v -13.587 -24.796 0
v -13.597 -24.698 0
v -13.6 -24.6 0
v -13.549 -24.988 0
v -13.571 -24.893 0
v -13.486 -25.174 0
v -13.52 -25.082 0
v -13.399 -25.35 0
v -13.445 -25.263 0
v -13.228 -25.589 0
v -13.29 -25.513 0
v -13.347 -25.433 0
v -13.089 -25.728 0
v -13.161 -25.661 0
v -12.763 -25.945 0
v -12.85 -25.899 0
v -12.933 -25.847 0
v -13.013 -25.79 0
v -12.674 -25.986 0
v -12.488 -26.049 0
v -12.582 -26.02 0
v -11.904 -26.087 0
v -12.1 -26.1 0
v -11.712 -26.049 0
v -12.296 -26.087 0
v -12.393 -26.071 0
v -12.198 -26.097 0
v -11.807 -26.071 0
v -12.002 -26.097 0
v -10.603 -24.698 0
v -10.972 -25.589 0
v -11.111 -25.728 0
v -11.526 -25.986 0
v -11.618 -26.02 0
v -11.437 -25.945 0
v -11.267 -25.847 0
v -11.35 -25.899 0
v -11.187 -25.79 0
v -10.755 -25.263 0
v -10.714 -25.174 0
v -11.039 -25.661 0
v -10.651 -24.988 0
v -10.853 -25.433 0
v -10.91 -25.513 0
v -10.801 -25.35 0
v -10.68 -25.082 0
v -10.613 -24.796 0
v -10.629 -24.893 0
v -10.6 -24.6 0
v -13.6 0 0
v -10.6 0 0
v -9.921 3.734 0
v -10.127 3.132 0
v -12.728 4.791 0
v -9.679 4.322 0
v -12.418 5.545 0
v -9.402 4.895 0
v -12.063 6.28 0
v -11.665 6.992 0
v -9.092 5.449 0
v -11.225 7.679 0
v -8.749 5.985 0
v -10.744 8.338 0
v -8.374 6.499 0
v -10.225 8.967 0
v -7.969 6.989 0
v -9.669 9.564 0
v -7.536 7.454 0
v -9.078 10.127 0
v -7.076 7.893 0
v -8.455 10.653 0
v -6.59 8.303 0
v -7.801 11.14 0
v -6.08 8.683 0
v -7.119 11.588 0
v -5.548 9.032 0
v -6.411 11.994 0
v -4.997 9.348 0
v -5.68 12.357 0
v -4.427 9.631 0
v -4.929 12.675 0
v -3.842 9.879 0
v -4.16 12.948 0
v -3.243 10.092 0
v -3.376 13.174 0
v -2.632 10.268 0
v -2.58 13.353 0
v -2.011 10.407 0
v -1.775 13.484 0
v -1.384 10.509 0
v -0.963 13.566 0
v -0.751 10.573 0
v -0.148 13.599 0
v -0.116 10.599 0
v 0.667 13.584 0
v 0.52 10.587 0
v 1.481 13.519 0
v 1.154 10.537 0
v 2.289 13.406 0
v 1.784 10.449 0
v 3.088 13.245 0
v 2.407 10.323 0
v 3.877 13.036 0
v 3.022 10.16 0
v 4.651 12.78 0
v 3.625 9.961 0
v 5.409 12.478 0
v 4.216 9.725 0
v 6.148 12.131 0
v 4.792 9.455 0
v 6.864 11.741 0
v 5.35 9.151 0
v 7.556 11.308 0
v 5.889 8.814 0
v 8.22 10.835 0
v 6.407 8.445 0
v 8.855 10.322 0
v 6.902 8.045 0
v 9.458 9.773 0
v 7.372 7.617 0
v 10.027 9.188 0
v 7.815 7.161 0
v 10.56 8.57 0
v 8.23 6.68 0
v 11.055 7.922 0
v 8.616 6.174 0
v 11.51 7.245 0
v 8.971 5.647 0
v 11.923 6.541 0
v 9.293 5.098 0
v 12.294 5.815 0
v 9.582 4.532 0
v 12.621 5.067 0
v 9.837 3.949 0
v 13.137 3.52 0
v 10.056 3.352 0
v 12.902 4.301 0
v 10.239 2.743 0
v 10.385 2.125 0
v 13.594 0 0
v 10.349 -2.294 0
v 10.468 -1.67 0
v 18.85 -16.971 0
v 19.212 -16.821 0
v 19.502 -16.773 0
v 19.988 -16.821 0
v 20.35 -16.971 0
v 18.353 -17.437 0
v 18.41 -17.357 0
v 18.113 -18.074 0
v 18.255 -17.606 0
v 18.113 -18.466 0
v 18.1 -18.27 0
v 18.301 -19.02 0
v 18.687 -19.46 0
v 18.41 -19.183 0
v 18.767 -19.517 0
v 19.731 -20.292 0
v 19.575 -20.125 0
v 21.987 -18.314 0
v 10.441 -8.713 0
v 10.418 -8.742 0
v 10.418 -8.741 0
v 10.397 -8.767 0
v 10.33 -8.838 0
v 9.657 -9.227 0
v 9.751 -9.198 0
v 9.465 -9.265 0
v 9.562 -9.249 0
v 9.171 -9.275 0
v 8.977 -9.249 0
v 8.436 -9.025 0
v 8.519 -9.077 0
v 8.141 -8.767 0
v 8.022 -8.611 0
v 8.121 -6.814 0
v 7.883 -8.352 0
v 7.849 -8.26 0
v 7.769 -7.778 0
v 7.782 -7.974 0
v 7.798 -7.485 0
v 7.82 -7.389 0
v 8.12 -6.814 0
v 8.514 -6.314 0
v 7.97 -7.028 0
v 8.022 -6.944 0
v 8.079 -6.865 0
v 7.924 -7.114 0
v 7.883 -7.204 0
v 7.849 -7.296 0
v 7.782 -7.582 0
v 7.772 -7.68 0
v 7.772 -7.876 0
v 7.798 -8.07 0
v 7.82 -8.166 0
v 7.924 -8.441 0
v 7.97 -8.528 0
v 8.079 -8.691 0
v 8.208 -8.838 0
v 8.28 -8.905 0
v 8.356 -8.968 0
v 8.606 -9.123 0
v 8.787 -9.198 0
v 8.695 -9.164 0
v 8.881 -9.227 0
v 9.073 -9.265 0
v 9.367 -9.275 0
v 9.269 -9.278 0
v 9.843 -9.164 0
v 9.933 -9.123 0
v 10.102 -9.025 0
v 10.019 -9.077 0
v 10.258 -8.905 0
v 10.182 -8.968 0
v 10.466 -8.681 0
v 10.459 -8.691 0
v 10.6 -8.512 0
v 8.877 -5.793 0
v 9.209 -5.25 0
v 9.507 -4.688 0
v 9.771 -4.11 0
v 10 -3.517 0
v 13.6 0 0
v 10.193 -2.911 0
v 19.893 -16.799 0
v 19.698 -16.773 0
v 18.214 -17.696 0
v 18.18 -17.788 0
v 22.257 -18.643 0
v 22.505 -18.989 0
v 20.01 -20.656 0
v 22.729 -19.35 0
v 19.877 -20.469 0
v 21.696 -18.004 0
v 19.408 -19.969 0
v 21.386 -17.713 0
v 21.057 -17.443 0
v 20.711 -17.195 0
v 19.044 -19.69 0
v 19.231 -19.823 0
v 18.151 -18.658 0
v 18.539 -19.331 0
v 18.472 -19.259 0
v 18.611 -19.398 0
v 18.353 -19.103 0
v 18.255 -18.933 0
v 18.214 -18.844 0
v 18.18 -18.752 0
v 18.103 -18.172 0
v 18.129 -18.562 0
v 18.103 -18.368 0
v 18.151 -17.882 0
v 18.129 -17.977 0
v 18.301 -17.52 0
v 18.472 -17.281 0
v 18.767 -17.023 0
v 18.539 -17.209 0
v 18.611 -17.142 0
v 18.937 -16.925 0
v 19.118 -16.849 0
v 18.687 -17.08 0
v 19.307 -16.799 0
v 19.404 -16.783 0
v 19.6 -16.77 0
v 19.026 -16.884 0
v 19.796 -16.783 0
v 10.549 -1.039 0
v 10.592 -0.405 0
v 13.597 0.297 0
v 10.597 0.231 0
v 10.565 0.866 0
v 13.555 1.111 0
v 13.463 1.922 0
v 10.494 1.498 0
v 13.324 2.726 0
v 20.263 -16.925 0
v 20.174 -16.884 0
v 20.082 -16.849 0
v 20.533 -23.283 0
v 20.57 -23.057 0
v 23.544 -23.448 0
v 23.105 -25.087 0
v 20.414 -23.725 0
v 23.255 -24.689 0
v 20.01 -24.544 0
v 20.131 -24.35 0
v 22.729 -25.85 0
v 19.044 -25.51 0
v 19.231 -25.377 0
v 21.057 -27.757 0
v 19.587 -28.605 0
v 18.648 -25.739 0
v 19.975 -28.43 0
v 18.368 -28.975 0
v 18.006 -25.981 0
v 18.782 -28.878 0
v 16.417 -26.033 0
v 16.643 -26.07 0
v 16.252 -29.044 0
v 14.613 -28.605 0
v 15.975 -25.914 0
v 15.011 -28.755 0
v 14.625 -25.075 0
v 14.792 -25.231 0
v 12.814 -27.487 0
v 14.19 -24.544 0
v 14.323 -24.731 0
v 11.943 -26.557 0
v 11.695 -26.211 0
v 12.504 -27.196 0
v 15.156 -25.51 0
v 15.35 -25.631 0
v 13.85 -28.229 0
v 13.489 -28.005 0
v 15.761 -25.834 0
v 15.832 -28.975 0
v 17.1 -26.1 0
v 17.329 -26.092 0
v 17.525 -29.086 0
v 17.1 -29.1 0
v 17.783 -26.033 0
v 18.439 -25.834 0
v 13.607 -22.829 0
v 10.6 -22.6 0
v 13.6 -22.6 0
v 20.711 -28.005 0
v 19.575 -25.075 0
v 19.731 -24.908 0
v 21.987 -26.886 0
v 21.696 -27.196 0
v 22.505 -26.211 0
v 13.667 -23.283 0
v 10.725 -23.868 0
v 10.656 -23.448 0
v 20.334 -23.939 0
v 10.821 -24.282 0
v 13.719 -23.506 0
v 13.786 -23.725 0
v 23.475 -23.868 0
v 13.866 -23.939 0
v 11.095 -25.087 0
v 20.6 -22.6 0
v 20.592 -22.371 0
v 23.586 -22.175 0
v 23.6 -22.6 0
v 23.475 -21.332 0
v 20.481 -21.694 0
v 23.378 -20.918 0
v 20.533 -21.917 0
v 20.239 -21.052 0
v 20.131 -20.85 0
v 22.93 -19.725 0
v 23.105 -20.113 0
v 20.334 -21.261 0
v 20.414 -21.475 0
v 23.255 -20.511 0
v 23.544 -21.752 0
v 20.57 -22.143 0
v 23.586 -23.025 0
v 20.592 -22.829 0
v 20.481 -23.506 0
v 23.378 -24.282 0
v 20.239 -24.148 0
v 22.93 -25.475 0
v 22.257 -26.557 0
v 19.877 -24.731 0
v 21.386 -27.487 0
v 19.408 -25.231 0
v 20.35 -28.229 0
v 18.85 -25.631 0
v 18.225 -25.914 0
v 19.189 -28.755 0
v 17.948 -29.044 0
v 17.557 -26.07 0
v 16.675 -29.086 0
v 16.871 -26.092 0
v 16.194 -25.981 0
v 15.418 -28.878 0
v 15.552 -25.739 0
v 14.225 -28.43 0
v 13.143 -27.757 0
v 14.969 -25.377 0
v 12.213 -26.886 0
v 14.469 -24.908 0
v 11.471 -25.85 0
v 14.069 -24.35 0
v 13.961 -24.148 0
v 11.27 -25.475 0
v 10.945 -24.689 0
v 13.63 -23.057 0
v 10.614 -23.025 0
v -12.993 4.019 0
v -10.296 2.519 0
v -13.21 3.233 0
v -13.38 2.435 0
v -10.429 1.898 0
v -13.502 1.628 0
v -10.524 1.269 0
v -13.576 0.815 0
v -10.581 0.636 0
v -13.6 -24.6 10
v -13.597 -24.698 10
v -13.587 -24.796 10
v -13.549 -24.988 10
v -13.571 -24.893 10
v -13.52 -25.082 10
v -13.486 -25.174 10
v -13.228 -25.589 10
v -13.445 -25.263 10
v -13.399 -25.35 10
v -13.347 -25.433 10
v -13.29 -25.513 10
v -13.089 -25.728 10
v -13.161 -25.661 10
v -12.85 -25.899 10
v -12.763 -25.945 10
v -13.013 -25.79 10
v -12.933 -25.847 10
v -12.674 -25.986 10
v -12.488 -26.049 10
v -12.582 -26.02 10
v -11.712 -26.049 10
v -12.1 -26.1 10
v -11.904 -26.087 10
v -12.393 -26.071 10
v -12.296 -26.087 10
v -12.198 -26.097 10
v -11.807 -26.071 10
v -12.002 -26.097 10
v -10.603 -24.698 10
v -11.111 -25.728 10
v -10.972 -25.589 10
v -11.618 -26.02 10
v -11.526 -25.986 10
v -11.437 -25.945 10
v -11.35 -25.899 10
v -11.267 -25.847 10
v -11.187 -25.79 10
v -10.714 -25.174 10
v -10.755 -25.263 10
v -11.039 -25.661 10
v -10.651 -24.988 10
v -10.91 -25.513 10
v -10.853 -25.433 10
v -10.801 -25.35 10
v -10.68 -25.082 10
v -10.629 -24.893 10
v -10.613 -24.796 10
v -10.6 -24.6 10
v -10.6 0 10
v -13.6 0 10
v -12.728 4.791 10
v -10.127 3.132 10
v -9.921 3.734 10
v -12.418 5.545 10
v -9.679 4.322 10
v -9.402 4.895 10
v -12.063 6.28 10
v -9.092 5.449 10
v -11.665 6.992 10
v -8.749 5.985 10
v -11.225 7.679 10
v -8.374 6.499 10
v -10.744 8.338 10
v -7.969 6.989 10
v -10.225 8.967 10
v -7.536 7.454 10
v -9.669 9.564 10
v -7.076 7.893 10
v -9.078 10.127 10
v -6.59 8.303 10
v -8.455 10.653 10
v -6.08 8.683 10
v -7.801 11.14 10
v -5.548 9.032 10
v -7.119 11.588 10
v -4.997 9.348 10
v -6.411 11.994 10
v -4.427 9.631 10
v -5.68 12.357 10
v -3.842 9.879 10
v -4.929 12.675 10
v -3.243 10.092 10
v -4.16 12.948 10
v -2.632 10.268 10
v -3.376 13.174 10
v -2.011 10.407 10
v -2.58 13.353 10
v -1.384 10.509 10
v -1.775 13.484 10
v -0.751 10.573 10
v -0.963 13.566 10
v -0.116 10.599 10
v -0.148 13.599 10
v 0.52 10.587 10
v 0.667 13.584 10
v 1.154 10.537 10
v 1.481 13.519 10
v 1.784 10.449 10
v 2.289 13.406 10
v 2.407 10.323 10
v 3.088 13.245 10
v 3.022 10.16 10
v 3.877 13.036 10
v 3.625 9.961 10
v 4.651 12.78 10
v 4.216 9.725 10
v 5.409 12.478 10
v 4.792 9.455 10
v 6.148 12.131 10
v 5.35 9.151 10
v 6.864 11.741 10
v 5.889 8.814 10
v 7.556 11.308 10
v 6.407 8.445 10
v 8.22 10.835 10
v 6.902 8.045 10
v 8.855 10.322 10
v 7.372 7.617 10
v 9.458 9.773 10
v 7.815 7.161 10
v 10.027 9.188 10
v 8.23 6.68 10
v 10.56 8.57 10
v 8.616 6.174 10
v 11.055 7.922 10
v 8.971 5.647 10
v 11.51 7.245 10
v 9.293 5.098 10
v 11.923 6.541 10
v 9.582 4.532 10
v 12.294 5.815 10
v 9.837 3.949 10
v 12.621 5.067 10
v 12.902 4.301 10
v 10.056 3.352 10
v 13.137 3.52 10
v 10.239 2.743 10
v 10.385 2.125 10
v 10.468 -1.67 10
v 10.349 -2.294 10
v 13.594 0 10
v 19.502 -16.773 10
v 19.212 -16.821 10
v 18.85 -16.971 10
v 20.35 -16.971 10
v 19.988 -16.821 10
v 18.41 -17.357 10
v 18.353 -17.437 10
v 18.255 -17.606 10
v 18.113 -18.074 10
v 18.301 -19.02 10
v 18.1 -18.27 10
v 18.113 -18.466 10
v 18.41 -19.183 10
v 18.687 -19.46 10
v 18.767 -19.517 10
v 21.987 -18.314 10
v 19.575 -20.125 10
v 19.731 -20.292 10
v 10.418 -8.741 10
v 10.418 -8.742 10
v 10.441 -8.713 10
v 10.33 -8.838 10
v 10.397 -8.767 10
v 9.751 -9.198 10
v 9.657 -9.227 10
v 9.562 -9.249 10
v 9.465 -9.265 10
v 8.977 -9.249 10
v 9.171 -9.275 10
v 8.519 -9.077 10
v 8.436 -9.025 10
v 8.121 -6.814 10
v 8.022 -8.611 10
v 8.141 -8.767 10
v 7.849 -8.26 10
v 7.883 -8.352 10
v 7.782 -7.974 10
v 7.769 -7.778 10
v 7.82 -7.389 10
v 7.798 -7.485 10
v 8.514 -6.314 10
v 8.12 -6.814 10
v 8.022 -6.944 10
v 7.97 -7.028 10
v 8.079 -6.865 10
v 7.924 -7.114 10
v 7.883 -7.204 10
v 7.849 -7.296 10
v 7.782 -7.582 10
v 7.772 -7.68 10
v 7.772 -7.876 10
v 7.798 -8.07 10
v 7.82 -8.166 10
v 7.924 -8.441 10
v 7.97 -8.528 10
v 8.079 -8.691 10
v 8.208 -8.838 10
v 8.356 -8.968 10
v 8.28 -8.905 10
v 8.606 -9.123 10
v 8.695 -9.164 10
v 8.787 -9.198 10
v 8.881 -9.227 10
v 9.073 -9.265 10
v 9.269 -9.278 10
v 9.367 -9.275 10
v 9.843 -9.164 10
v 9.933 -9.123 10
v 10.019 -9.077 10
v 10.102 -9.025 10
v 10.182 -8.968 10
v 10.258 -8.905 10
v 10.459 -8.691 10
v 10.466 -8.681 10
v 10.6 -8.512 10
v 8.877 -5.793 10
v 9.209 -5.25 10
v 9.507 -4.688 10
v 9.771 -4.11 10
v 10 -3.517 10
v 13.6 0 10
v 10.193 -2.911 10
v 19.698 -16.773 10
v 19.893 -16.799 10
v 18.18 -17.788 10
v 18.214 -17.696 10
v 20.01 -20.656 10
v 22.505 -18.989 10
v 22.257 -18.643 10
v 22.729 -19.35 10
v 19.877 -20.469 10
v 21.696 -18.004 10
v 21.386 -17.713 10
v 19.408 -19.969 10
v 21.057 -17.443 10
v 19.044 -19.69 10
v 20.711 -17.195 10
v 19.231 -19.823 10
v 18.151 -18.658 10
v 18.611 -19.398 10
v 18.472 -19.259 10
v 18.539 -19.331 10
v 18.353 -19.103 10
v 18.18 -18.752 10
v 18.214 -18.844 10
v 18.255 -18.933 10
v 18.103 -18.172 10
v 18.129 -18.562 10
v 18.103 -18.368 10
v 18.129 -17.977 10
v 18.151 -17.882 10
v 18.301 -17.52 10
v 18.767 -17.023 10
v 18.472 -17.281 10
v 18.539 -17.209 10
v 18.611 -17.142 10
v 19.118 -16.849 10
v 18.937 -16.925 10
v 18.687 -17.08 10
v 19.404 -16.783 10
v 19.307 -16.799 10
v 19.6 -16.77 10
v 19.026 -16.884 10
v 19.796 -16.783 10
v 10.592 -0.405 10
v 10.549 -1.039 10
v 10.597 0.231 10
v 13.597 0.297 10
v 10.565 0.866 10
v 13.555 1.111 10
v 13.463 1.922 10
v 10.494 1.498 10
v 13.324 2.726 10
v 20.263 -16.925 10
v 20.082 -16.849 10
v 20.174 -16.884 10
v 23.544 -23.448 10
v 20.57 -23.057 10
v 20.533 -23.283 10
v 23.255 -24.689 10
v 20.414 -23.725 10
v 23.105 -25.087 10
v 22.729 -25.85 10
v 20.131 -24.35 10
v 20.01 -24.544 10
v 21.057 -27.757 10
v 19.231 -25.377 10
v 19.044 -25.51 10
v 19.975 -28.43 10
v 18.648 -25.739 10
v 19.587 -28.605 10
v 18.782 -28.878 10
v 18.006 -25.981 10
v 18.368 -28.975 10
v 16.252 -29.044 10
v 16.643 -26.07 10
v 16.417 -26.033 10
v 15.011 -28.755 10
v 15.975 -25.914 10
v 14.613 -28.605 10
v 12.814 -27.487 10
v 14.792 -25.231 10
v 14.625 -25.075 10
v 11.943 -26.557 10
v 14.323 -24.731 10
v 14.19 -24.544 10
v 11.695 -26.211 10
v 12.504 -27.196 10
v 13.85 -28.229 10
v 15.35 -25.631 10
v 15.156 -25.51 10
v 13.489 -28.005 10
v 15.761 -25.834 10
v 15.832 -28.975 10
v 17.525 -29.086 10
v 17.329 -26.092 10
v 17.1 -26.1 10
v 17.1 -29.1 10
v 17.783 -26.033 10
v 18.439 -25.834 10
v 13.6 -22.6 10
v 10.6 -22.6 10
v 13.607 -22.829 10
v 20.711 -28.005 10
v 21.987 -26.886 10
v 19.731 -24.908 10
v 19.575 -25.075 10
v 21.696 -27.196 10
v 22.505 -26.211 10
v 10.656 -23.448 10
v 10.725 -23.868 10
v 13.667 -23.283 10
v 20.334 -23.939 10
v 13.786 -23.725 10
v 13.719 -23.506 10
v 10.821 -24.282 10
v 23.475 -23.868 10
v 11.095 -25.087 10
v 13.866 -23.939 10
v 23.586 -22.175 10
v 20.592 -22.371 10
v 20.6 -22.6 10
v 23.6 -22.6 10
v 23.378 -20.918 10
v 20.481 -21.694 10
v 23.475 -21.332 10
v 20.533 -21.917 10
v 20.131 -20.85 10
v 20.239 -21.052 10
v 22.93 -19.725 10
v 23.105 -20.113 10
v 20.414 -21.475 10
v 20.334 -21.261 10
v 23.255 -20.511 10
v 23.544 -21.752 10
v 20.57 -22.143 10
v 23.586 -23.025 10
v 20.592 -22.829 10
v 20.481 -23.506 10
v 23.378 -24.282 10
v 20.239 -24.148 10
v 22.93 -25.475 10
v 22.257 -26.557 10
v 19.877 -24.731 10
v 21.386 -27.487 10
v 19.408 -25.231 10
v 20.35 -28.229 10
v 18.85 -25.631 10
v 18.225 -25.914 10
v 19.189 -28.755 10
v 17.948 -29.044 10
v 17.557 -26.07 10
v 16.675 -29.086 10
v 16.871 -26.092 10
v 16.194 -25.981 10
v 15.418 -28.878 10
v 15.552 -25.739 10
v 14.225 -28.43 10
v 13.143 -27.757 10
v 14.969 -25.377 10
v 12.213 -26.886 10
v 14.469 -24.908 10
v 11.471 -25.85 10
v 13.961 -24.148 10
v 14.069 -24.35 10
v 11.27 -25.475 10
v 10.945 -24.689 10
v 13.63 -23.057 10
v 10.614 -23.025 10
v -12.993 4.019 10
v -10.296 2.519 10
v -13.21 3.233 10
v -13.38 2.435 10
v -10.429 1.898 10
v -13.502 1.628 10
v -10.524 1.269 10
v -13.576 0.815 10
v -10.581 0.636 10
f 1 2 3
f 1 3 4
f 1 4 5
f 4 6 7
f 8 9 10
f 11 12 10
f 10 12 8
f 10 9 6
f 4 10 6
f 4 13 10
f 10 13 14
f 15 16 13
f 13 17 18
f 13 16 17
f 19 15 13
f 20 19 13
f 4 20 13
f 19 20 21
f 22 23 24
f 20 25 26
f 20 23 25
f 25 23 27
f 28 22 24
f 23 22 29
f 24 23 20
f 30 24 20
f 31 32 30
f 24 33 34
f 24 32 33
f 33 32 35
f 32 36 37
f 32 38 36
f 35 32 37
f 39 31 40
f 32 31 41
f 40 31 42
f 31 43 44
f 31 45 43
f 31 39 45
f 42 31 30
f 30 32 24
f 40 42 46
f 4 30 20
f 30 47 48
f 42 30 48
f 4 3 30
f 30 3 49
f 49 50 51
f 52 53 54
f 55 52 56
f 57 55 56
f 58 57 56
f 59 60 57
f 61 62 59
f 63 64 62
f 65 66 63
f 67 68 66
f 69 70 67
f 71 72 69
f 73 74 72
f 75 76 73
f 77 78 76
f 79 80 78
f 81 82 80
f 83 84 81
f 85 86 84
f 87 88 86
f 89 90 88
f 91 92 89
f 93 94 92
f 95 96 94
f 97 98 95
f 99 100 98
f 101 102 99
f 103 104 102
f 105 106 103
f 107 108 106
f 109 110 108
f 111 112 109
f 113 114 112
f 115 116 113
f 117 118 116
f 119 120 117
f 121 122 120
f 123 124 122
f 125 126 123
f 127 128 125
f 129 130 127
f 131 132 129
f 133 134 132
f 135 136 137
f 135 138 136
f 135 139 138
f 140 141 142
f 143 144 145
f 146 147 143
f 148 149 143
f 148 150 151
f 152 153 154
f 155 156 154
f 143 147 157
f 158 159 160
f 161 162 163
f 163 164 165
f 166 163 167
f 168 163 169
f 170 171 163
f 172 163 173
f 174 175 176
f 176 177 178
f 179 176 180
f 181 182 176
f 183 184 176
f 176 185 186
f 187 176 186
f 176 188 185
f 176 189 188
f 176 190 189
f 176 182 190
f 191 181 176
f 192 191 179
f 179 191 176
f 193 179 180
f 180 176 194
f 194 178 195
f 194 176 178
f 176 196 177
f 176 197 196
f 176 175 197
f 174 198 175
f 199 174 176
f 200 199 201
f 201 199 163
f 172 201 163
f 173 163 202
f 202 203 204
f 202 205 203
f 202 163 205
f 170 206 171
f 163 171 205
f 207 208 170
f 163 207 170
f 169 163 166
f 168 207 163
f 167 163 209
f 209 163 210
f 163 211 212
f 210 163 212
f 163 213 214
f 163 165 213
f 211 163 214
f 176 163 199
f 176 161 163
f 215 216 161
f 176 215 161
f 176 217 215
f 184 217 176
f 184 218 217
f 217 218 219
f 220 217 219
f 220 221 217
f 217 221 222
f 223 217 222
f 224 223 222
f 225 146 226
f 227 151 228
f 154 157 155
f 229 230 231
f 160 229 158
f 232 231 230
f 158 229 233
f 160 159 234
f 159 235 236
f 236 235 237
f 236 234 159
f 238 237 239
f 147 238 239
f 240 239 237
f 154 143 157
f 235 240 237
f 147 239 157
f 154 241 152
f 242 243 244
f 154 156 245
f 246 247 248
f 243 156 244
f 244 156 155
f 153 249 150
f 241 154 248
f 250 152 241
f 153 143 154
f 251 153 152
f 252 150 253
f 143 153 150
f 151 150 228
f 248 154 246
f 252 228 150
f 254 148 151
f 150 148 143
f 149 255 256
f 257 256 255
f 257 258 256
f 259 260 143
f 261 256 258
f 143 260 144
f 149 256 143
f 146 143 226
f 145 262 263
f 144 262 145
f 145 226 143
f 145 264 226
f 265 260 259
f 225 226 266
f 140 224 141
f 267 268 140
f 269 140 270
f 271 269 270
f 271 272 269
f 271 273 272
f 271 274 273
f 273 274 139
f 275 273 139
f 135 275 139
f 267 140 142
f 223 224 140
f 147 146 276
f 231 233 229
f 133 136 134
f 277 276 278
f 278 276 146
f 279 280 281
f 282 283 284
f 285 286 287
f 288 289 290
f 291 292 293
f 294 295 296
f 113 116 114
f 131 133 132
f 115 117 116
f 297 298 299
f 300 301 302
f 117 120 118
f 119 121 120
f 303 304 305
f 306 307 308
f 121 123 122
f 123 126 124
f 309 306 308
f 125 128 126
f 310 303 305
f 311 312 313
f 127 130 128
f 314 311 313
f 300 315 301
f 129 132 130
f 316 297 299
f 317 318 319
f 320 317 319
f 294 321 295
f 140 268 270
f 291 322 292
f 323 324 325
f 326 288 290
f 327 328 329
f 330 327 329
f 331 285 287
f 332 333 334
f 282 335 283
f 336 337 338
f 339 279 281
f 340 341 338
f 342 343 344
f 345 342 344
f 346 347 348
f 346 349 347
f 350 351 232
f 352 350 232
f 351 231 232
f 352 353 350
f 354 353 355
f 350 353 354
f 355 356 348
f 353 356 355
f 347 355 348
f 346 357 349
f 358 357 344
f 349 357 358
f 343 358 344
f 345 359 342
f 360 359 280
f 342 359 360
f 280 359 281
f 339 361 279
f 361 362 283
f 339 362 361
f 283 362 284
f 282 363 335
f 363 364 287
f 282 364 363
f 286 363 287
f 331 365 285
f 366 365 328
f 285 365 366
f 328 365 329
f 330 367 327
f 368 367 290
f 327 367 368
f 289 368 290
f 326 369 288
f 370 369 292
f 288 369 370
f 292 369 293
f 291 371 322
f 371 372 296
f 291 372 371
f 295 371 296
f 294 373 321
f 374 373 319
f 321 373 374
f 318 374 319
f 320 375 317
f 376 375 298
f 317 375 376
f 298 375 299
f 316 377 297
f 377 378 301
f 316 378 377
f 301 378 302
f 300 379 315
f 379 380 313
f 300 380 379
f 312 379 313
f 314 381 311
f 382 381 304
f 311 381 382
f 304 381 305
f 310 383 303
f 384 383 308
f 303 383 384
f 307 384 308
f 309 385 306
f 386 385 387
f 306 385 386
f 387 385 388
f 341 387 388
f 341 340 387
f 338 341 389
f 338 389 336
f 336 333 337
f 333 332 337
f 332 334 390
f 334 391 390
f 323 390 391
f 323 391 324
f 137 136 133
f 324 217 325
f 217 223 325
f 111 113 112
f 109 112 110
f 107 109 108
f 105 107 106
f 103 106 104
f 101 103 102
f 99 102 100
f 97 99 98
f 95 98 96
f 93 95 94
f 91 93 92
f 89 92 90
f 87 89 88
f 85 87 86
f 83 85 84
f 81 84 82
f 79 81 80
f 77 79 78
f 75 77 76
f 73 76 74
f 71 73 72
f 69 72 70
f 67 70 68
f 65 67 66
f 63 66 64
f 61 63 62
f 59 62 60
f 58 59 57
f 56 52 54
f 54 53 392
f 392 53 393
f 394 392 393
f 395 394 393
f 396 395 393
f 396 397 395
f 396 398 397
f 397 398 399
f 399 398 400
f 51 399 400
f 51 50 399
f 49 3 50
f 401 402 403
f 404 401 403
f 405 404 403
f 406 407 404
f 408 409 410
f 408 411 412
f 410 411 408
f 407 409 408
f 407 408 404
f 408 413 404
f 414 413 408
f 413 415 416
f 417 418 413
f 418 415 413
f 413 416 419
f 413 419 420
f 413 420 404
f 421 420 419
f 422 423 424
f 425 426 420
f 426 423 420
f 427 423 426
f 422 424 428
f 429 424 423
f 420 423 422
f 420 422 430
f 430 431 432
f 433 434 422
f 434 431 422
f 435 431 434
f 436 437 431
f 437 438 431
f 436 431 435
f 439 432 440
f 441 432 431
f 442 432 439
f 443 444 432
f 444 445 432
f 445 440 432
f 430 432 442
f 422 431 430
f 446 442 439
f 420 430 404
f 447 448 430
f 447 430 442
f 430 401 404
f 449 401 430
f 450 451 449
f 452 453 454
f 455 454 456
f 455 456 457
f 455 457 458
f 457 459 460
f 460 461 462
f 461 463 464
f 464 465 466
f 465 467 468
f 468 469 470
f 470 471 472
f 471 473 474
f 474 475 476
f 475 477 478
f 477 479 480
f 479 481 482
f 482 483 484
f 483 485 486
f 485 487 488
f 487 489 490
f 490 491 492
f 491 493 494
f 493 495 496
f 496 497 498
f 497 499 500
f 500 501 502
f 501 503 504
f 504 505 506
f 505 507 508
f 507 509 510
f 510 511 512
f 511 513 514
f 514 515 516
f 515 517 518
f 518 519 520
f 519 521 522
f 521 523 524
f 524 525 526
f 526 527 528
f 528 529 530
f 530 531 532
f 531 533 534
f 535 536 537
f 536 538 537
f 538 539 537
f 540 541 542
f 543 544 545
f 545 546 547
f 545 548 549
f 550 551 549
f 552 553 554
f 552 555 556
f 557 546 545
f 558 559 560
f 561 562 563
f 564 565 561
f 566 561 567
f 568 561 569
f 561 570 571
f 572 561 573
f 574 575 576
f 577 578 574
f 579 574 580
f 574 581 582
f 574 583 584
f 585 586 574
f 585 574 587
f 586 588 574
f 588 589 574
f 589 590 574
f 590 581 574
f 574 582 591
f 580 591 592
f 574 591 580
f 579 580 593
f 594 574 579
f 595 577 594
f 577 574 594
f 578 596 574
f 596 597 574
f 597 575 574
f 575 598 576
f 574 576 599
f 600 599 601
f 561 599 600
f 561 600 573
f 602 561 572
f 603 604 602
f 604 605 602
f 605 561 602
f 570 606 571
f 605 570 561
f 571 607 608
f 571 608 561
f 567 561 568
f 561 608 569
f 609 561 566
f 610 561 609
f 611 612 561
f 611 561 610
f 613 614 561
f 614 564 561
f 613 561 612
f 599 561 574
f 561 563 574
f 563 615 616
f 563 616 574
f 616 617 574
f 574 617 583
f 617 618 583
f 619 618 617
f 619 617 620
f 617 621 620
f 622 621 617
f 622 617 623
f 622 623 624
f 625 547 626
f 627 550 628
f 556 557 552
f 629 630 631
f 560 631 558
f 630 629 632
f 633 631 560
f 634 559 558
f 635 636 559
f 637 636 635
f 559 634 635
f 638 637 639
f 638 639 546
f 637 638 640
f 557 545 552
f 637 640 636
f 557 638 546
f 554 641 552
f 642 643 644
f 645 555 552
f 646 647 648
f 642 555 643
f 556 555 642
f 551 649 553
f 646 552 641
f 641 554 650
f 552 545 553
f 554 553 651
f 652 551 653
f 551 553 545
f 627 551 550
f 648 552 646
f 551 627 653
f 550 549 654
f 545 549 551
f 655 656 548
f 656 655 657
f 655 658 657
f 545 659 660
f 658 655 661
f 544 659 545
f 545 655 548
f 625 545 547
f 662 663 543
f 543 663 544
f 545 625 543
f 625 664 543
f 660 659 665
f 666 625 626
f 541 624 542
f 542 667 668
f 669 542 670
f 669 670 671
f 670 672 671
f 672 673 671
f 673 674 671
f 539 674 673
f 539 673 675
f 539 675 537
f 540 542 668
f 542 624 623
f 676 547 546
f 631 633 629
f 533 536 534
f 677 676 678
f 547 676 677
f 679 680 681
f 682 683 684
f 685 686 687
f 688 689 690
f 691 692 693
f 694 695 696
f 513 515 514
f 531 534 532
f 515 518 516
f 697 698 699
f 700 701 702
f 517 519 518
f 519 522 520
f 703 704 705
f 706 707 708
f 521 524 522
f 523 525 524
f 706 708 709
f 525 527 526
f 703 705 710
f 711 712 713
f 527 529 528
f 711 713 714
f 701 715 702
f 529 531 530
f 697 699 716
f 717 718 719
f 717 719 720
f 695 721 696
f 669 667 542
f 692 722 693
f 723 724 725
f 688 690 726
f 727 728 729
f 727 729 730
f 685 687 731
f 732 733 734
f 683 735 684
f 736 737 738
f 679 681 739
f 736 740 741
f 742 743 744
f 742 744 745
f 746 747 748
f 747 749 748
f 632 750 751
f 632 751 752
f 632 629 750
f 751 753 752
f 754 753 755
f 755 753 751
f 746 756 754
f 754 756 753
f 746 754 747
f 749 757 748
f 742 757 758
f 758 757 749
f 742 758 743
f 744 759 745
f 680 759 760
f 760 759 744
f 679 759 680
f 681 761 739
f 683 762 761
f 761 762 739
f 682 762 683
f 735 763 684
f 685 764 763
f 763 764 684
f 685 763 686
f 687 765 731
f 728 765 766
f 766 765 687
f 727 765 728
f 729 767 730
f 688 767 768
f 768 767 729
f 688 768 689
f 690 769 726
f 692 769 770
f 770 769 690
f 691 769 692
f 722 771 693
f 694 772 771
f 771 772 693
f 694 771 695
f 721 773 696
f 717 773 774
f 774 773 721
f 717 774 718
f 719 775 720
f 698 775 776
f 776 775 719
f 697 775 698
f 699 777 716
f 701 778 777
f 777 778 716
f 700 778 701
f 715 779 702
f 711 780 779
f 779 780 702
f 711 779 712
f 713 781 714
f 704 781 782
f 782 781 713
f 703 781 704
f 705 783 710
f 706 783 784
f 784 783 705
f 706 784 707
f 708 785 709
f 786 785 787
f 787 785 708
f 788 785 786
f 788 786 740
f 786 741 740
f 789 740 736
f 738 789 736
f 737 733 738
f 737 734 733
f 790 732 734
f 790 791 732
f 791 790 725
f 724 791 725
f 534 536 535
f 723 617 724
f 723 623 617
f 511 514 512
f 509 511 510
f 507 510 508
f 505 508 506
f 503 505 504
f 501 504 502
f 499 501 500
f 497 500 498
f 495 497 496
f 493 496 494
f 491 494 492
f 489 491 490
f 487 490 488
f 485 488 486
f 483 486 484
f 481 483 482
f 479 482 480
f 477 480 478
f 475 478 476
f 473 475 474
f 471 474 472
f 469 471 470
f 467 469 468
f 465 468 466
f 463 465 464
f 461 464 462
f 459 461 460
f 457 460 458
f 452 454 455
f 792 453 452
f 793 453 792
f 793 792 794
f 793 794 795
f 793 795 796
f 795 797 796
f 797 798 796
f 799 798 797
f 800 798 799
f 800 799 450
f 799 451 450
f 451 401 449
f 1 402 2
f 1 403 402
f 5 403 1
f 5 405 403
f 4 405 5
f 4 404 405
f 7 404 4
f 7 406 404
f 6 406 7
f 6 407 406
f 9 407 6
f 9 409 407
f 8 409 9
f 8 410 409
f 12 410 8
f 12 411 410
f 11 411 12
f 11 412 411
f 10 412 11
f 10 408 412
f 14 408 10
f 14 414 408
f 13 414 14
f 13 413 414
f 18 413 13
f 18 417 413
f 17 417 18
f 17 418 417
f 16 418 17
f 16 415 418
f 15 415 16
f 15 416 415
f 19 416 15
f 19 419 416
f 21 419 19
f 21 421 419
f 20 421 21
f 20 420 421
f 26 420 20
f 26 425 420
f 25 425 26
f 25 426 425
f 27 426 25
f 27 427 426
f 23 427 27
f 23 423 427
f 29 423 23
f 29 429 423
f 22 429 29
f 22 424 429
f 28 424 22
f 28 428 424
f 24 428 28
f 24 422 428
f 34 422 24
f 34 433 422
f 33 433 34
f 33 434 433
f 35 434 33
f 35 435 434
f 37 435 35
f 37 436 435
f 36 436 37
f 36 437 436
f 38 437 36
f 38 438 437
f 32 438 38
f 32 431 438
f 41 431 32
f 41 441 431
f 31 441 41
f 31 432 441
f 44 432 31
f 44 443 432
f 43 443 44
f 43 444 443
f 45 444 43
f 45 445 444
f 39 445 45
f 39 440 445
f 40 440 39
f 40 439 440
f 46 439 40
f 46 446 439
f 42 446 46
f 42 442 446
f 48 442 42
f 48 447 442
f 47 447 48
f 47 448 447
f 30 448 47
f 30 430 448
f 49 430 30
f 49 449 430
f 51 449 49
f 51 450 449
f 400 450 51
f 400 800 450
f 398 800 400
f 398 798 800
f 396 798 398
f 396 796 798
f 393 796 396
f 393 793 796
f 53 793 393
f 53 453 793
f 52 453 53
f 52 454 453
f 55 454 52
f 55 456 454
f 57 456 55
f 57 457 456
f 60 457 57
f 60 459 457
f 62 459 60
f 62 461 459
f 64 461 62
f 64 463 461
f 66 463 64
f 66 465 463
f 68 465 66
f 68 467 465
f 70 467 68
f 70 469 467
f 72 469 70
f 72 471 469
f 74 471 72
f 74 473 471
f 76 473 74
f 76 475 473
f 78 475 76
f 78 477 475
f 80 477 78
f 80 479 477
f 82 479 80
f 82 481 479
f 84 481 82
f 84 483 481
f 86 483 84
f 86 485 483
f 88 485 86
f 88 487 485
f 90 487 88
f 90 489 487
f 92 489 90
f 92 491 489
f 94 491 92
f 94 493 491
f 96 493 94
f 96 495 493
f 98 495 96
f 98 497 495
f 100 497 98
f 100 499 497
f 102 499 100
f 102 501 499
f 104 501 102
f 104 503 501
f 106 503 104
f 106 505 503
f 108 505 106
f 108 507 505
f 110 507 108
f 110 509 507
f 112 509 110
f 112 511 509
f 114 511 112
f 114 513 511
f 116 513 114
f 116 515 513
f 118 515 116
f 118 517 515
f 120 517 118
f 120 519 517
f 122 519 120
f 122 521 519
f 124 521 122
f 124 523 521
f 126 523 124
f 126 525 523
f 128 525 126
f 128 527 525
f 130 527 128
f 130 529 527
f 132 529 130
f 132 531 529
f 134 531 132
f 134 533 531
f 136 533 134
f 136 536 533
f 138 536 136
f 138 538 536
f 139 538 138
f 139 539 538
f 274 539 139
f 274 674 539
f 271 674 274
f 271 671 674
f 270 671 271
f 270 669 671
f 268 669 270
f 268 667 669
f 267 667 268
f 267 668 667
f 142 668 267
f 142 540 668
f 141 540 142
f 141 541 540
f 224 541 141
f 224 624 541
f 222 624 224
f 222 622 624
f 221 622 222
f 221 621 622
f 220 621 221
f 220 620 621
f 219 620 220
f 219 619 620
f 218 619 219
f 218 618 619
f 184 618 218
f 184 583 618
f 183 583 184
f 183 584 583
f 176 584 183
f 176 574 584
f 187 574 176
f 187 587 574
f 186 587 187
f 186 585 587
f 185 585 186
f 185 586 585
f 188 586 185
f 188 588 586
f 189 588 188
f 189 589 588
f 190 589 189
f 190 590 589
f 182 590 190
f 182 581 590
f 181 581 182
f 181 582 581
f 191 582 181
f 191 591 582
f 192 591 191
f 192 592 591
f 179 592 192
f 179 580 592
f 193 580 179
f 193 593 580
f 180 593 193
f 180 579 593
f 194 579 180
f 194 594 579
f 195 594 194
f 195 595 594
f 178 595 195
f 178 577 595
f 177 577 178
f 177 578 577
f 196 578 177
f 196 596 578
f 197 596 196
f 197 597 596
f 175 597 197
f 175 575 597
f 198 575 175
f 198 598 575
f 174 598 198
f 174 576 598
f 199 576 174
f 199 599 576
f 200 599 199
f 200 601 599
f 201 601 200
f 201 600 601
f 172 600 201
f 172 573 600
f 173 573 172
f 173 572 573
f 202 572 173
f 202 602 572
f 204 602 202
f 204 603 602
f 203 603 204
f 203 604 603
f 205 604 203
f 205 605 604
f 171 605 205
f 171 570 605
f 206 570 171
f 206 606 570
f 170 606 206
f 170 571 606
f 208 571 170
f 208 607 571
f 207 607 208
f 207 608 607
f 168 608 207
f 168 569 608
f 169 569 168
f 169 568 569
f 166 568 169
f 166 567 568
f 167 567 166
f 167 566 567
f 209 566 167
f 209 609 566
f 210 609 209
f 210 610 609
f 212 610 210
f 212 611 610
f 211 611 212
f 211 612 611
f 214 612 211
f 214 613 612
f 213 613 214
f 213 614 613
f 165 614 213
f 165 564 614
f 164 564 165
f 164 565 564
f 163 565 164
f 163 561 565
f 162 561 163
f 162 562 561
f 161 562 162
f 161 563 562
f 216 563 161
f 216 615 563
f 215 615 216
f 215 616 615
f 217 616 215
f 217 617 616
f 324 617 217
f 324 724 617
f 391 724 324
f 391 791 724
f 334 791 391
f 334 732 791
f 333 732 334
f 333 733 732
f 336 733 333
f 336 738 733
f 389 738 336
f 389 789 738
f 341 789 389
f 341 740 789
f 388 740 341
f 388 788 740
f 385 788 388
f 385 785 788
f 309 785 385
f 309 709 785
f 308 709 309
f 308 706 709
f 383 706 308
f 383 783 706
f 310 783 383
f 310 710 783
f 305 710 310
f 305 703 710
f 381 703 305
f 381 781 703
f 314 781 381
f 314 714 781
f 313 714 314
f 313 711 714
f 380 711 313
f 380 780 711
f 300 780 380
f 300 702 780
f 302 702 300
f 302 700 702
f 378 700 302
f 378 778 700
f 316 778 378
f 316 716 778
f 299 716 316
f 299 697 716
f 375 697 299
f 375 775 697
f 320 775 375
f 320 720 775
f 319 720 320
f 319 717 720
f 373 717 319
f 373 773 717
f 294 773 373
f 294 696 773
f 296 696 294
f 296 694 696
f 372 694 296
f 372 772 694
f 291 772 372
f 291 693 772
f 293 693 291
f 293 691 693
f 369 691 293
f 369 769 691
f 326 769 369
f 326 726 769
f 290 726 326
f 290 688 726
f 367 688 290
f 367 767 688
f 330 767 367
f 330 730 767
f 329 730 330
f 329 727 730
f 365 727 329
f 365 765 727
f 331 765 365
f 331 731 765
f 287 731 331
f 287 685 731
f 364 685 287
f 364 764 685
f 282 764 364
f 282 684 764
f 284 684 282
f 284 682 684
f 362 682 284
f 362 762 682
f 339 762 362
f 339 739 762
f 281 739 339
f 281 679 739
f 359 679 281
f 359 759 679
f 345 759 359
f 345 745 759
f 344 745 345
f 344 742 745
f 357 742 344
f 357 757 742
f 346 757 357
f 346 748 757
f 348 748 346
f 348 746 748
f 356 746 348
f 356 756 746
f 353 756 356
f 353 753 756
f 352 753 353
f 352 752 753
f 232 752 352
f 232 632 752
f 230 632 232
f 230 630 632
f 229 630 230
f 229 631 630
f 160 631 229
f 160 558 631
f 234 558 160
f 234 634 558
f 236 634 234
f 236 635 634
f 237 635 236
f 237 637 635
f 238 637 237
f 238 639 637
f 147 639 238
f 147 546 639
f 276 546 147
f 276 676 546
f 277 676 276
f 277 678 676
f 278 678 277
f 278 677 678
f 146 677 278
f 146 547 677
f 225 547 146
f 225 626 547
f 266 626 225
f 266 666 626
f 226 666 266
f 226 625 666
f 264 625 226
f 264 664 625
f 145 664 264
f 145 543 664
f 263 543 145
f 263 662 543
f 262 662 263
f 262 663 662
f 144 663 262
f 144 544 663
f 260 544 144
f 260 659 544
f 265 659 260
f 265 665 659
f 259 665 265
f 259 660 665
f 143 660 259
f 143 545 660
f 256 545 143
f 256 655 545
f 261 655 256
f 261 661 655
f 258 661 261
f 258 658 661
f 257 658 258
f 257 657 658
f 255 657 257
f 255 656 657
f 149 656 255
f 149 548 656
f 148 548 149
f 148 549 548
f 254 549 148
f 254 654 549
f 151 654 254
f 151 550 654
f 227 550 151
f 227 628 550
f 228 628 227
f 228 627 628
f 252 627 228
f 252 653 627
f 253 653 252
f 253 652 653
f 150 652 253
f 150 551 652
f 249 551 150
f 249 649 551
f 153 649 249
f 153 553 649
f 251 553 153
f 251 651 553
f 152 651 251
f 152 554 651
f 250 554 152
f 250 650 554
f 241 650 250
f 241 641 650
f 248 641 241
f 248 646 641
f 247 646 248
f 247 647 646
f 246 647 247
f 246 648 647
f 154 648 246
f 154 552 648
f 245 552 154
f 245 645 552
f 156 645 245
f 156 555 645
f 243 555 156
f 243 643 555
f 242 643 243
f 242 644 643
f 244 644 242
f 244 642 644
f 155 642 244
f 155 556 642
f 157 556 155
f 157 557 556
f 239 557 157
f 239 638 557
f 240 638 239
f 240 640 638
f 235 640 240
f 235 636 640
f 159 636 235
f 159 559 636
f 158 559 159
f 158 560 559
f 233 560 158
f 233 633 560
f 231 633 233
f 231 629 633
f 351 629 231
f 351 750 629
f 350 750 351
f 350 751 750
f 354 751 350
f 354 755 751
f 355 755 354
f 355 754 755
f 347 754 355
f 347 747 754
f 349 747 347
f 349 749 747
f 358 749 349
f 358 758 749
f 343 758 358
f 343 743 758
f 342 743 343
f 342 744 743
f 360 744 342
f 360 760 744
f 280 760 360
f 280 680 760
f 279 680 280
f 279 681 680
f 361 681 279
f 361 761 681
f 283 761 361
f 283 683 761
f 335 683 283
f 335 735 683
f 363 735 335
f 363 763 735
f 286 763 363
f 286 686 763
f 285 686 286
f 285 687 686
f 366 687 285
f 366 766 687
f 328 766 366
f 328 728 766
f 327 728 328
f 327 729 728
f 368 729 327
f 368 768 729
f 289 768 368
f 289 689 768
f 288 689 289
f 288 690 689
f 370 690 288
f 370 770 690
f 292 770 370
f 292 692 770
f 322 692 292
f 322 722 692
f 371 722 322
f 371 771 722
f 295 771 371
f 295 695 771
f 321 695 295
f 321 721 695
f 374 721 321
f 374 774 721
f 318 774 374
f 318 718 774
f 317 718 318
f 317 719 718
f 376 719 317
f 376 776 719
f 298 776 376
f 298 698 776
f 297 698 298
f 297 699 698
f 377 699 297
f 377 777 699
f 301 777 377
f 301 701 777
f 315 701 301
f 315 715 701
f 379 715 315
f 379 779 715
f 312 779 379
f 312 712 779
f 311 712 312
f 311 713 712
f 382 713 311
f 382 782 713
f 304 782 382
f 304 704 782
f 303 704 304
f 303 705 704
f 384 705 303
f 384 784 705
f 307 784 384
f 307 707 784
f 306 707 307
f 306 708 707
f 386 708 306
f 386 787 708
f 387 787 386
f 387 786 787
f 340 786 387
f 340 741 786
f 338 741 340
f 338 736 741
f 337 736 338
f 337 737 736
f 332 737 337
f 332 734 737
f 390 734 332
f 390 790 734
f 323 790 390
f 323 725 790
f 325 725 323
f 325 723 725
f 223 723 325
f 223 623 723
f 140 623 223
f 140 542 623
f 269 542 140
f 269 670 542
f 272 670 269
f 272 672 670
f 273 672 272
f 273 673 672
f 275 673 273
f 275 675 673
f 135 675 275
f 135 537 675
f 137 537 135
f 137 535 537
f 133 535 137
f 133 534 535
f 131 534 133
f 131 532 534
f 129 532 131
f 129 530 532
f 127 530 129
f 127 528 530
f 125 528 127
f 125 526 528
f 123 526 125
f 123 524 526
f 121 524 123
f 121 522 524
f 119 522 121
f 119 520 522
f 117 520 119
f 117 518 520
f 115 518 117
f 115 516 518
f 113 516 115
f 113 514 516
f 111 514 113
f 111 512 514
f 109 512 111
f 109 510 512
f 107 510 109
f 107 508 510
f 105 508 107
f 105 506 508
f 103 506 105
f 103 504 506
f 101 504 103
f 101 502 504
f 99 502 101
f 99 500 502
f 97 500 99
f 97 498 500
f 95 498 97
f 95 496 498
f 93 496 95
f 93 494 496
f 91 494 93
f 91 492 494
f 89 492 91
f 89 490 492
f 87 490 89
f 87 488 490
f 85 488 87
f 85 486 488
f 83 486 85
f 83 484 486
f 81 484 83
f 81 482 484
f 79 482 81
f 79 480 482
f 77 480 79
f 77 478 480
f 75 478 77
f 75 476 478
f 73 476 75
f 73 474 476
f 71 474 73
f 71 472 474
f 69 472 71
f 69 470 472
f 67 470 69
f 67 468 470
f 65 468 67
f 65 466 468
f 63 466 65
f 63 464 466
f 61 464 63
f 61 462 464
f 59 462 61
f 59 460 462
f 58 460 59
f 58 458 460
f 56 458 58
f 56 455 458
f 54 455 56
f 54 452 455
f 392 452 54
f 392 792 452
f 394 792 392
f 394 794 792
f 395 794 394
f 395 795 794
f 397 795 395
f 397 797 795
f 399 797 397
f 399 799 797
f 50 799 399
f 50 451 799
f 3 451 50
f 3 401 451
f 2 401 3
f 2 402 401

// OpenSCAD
// file: ../haken.scad
// =====================================================================
//  Haken fuer Weihnachts-LED-Lichterketten
//  - Dachrinnen-Haken (halbrunde Rinne mit Wulst / Bordel)
//  - Wandhaken zum Schrauben (Holz, Fassade mit Duebel)
//  - Wandhaken zum Kleben (Fassade, Fensterrahmen ...)
//
//  Parametrisch: Werte unten anpassen oder per Kommandozeile, z.B.
//    openscad -D 'teil="rinne"' -D wulst_d=20 -o haken.stl haken.scad
//  Alle Masse in mm.
// =====================================================================

/* [Auswahl] */
// Welches Teil soll erzeugt werden?
teil = "rinne"; // [rinne, schraube, kleben, alle]

/* [Dachrinnen-Haken] */
// Durchmesser des Rinnenwulstes (vorne an der Rinne) - mit Messschieber messen!
wulst_d   = 20;
// Spiel zwischen Wulst und Haken
spiel     = 0.6;
// Wie weit der Haken vorne unter den Wulst greift (Grad, mehr = fester)
untergriff = 40;
// Laenge des Beins, das innen in der Rinne haengt (unter Wulstmitte)
bein_innen = 14;
// Wie weit die Lichterkette unter dem Wulst haengt (unter Unterkante Wulst)
abhang     = 12;

/* [Wandhaken] */
// Groesse der Grundplatte (Breite x Hoehe)
platte_b  = 24;
platte_h  = 40;
// Dicke der Grundplatte
platte_t  = 4;
// Abstand Kabelauflage von der Wand
arm_l     = 14;
// Hoehe der vorderen Lippe ueber dem Arm
lippe_h   = 5;
// Schraubenloch (fuer 3,5-4 mm Holzschrauben bzw. 4 mm Schraube im Duebel)
loch_d    = 4.5;
// Senkkopf-Durchmesser
senk_d    = 8.6;

/* [Allgemein] */
// Materialstaerke der Haken
t         = 3;
// Breite (Druckhoehe) des Dachrinnen-Hakens
breite    = 10;
// Radius der Kabelaufnahme (3.5 = Kabel bis ca. 6 mm)
kabel_r   = 3.5;
// Winkel, bis zu dem sich die Kabelaufnahme schliesst (groesser = haelt fester)
haken_ende = 60;

$fn = 96;

// ---------------------------------------------------------------------
//  Hilfsfunktionen
// ---------------------------------------------------------------------
function bogen(r, a0, a1, n = 64) =
    [for (i = [0 : n]) let (a = a0 + (a1 - a0) * i / n) [r * cos(a), r * sin(a)]];

// Kreisring-Segment mit abgerundeten Enden
module ring_seg(c, ri, ro, a0, a1) {
    rm = (ri + ro) / 2;
    tw = ro - ri;
    translate(c) {
        polygon(concat(bogen(ro, a0, a1), bogen(ri, a1, a0)));
        for (a = [a0, a1]) translate([rm * cos(a), rm * sin(a)]) circle(d = tw);
    }
}

// J-foermige Kabelaufnahme; Rueckwand liegt bei x = x_wand, Grund bei y = y_grund
module kabel_haken(x_wand, y_mitte) {
    ring_seg([x_wand + kabel_r, y_mitte], kabel_r, kabel_r + t, 180, 360 + haken_ende);
}

// ---------------------------------------------------------------------
//  1) Dachrinnen-Haken  (Profil liegt flach auf dem Druckbett)
//     Ursprung = Mitte des Wulstes, +x = nach vorne (weg vom Haus)
// ---------------------------------------------------------------------
module rinne_profil() {
    R    = wulst_d / 2 + spiel;
    tief = R + abhang;                       // Hoehe Kabelaufnahme unter Wulstmitte
    union() {
        // Buegel ueber den Wulst: von innen (hinten) ueber oben nach vorne und darunter
        ring_seg([0, 0], R, R + t, -untergriff, 180);
        // Bein innen in der Rinne (stuetzt sich an der Rinnenwand ab -> kein Verdrehen)
        translate([-(R + t), -(R + bein_innen)]) square([t, R + bein_innen]);
        translate([-(R + t / 2), -(R + bein_innen)]) circle(d = t);
        // Steg vorne nach unten
        translate([R, -tief]) square([t, tief]);
        // Kabelaufnahme
        kabel_haken(R + t, -tief);
    }
}

module rinnen_haken() {
    linear_extrude(height = breite) rinne_profil();
}

// ---------------------------------------------------------------------
//  2/3) Wandhaken  (Grundplatte liegt flach auf dem Bett = glatte Seite
//       an die Wand, ideal fuer Klebeband)
//       Koordinaten: x = Breite, y = Hoehe an der Wand (oben = +y), z = von Wand weg
// ---------------------------------------------------------------------
module wandhaken(mit_loch) {
    l      = arm_l + t;                         // Arm-Laenge von Plattenoberseite
    arm_y  = mit_loch ? 6 : (platte_h - t) / 2; // Lage des Arms auf der Platte
    loch_y = platte_h - 9;
    difference() {
        union() {
            // Grundplatte mit abgerundeten Ecken
            linear_extrude(height = platte_t)
                offset(r = 3) offset(delta = -3) square([platte_b, platte_h]);

            // Arm + Lippe als extrudiertes Seitenprofil (in y-z-Ebene)
            translate([0, arm_y, platte_t])
                rotate([90, 0, 90]) linear_extrude(height = platte_b)
                    polygon([
                        // y (an der Wand nach oben), z (von der Wand weg)
                        [-2.5, 0],                    // Hohlkehle unten
                        [t + 2.5, 0],                 // Hohlkehle oben
                        [t, 2.5],
                        [t, l - t - lippe_h],         // Kabelauflage (Oberseite Arm)
                        [t + lippe_h, l - t],         // 45-Grad-Fase unter der Lippe
                        [t + lippe_h, l],             // Lippe vorne
                        [0, l],
                        [0, 2.5]
                    ]);
        }
        if (mit_loch) {
            // Durchgangsloch + Senkung (Senkung auf der Vorderseite = oben im Druck)
            translate([platte_b / 2, loch_y, -1]) cylinder(d = loch_d, h = platte_t + 2);
            translate([platte_b / 2, loch_y, platte_t - (senk_d - loch_d) / 2])
                cylinder(d1 = loch_d, d2 = senk_d + 0.01, h = (senk_d - loch_d) / 2 + 0.01);
        }
    }
}

// ---------------------------------------------------------------------
//  Ausgabe
// ---------------------------------------------------------------------
if (teil != "keins" && teil == "rinne")    rinnen_haken();
if (teil != "keins" && teil == "schraube") wandhaken(true);
if (teil != "keins" && teil == "kleben")   wandhaken(false);
if (teil != "keins" && teil == "alle") {
    rinnen_haken();
    translate([45, -20, 0]) wandhaken(true);
    translate([80, -20, 0]) wandhaken(false);
}
// main file
include <../haken.scad>
// Nur Vorschau: Rinnenwulst + Rinnenwand (grau) mit Haken (rot)
color("red") rinne_profil();
color("silver") translate([0,0,1]) difference(){ circle(d=wulst_d); circle(d=wulst_d-1.2); }
color("silver") translate([-wulst_d/2,-60,1]) square([0.8,60]);
color("blue") translate([wulst_d/2+spiel+t+kabel_r,-(wulst_d/2+spiel+abhang),1]) circle(r=2.5);
